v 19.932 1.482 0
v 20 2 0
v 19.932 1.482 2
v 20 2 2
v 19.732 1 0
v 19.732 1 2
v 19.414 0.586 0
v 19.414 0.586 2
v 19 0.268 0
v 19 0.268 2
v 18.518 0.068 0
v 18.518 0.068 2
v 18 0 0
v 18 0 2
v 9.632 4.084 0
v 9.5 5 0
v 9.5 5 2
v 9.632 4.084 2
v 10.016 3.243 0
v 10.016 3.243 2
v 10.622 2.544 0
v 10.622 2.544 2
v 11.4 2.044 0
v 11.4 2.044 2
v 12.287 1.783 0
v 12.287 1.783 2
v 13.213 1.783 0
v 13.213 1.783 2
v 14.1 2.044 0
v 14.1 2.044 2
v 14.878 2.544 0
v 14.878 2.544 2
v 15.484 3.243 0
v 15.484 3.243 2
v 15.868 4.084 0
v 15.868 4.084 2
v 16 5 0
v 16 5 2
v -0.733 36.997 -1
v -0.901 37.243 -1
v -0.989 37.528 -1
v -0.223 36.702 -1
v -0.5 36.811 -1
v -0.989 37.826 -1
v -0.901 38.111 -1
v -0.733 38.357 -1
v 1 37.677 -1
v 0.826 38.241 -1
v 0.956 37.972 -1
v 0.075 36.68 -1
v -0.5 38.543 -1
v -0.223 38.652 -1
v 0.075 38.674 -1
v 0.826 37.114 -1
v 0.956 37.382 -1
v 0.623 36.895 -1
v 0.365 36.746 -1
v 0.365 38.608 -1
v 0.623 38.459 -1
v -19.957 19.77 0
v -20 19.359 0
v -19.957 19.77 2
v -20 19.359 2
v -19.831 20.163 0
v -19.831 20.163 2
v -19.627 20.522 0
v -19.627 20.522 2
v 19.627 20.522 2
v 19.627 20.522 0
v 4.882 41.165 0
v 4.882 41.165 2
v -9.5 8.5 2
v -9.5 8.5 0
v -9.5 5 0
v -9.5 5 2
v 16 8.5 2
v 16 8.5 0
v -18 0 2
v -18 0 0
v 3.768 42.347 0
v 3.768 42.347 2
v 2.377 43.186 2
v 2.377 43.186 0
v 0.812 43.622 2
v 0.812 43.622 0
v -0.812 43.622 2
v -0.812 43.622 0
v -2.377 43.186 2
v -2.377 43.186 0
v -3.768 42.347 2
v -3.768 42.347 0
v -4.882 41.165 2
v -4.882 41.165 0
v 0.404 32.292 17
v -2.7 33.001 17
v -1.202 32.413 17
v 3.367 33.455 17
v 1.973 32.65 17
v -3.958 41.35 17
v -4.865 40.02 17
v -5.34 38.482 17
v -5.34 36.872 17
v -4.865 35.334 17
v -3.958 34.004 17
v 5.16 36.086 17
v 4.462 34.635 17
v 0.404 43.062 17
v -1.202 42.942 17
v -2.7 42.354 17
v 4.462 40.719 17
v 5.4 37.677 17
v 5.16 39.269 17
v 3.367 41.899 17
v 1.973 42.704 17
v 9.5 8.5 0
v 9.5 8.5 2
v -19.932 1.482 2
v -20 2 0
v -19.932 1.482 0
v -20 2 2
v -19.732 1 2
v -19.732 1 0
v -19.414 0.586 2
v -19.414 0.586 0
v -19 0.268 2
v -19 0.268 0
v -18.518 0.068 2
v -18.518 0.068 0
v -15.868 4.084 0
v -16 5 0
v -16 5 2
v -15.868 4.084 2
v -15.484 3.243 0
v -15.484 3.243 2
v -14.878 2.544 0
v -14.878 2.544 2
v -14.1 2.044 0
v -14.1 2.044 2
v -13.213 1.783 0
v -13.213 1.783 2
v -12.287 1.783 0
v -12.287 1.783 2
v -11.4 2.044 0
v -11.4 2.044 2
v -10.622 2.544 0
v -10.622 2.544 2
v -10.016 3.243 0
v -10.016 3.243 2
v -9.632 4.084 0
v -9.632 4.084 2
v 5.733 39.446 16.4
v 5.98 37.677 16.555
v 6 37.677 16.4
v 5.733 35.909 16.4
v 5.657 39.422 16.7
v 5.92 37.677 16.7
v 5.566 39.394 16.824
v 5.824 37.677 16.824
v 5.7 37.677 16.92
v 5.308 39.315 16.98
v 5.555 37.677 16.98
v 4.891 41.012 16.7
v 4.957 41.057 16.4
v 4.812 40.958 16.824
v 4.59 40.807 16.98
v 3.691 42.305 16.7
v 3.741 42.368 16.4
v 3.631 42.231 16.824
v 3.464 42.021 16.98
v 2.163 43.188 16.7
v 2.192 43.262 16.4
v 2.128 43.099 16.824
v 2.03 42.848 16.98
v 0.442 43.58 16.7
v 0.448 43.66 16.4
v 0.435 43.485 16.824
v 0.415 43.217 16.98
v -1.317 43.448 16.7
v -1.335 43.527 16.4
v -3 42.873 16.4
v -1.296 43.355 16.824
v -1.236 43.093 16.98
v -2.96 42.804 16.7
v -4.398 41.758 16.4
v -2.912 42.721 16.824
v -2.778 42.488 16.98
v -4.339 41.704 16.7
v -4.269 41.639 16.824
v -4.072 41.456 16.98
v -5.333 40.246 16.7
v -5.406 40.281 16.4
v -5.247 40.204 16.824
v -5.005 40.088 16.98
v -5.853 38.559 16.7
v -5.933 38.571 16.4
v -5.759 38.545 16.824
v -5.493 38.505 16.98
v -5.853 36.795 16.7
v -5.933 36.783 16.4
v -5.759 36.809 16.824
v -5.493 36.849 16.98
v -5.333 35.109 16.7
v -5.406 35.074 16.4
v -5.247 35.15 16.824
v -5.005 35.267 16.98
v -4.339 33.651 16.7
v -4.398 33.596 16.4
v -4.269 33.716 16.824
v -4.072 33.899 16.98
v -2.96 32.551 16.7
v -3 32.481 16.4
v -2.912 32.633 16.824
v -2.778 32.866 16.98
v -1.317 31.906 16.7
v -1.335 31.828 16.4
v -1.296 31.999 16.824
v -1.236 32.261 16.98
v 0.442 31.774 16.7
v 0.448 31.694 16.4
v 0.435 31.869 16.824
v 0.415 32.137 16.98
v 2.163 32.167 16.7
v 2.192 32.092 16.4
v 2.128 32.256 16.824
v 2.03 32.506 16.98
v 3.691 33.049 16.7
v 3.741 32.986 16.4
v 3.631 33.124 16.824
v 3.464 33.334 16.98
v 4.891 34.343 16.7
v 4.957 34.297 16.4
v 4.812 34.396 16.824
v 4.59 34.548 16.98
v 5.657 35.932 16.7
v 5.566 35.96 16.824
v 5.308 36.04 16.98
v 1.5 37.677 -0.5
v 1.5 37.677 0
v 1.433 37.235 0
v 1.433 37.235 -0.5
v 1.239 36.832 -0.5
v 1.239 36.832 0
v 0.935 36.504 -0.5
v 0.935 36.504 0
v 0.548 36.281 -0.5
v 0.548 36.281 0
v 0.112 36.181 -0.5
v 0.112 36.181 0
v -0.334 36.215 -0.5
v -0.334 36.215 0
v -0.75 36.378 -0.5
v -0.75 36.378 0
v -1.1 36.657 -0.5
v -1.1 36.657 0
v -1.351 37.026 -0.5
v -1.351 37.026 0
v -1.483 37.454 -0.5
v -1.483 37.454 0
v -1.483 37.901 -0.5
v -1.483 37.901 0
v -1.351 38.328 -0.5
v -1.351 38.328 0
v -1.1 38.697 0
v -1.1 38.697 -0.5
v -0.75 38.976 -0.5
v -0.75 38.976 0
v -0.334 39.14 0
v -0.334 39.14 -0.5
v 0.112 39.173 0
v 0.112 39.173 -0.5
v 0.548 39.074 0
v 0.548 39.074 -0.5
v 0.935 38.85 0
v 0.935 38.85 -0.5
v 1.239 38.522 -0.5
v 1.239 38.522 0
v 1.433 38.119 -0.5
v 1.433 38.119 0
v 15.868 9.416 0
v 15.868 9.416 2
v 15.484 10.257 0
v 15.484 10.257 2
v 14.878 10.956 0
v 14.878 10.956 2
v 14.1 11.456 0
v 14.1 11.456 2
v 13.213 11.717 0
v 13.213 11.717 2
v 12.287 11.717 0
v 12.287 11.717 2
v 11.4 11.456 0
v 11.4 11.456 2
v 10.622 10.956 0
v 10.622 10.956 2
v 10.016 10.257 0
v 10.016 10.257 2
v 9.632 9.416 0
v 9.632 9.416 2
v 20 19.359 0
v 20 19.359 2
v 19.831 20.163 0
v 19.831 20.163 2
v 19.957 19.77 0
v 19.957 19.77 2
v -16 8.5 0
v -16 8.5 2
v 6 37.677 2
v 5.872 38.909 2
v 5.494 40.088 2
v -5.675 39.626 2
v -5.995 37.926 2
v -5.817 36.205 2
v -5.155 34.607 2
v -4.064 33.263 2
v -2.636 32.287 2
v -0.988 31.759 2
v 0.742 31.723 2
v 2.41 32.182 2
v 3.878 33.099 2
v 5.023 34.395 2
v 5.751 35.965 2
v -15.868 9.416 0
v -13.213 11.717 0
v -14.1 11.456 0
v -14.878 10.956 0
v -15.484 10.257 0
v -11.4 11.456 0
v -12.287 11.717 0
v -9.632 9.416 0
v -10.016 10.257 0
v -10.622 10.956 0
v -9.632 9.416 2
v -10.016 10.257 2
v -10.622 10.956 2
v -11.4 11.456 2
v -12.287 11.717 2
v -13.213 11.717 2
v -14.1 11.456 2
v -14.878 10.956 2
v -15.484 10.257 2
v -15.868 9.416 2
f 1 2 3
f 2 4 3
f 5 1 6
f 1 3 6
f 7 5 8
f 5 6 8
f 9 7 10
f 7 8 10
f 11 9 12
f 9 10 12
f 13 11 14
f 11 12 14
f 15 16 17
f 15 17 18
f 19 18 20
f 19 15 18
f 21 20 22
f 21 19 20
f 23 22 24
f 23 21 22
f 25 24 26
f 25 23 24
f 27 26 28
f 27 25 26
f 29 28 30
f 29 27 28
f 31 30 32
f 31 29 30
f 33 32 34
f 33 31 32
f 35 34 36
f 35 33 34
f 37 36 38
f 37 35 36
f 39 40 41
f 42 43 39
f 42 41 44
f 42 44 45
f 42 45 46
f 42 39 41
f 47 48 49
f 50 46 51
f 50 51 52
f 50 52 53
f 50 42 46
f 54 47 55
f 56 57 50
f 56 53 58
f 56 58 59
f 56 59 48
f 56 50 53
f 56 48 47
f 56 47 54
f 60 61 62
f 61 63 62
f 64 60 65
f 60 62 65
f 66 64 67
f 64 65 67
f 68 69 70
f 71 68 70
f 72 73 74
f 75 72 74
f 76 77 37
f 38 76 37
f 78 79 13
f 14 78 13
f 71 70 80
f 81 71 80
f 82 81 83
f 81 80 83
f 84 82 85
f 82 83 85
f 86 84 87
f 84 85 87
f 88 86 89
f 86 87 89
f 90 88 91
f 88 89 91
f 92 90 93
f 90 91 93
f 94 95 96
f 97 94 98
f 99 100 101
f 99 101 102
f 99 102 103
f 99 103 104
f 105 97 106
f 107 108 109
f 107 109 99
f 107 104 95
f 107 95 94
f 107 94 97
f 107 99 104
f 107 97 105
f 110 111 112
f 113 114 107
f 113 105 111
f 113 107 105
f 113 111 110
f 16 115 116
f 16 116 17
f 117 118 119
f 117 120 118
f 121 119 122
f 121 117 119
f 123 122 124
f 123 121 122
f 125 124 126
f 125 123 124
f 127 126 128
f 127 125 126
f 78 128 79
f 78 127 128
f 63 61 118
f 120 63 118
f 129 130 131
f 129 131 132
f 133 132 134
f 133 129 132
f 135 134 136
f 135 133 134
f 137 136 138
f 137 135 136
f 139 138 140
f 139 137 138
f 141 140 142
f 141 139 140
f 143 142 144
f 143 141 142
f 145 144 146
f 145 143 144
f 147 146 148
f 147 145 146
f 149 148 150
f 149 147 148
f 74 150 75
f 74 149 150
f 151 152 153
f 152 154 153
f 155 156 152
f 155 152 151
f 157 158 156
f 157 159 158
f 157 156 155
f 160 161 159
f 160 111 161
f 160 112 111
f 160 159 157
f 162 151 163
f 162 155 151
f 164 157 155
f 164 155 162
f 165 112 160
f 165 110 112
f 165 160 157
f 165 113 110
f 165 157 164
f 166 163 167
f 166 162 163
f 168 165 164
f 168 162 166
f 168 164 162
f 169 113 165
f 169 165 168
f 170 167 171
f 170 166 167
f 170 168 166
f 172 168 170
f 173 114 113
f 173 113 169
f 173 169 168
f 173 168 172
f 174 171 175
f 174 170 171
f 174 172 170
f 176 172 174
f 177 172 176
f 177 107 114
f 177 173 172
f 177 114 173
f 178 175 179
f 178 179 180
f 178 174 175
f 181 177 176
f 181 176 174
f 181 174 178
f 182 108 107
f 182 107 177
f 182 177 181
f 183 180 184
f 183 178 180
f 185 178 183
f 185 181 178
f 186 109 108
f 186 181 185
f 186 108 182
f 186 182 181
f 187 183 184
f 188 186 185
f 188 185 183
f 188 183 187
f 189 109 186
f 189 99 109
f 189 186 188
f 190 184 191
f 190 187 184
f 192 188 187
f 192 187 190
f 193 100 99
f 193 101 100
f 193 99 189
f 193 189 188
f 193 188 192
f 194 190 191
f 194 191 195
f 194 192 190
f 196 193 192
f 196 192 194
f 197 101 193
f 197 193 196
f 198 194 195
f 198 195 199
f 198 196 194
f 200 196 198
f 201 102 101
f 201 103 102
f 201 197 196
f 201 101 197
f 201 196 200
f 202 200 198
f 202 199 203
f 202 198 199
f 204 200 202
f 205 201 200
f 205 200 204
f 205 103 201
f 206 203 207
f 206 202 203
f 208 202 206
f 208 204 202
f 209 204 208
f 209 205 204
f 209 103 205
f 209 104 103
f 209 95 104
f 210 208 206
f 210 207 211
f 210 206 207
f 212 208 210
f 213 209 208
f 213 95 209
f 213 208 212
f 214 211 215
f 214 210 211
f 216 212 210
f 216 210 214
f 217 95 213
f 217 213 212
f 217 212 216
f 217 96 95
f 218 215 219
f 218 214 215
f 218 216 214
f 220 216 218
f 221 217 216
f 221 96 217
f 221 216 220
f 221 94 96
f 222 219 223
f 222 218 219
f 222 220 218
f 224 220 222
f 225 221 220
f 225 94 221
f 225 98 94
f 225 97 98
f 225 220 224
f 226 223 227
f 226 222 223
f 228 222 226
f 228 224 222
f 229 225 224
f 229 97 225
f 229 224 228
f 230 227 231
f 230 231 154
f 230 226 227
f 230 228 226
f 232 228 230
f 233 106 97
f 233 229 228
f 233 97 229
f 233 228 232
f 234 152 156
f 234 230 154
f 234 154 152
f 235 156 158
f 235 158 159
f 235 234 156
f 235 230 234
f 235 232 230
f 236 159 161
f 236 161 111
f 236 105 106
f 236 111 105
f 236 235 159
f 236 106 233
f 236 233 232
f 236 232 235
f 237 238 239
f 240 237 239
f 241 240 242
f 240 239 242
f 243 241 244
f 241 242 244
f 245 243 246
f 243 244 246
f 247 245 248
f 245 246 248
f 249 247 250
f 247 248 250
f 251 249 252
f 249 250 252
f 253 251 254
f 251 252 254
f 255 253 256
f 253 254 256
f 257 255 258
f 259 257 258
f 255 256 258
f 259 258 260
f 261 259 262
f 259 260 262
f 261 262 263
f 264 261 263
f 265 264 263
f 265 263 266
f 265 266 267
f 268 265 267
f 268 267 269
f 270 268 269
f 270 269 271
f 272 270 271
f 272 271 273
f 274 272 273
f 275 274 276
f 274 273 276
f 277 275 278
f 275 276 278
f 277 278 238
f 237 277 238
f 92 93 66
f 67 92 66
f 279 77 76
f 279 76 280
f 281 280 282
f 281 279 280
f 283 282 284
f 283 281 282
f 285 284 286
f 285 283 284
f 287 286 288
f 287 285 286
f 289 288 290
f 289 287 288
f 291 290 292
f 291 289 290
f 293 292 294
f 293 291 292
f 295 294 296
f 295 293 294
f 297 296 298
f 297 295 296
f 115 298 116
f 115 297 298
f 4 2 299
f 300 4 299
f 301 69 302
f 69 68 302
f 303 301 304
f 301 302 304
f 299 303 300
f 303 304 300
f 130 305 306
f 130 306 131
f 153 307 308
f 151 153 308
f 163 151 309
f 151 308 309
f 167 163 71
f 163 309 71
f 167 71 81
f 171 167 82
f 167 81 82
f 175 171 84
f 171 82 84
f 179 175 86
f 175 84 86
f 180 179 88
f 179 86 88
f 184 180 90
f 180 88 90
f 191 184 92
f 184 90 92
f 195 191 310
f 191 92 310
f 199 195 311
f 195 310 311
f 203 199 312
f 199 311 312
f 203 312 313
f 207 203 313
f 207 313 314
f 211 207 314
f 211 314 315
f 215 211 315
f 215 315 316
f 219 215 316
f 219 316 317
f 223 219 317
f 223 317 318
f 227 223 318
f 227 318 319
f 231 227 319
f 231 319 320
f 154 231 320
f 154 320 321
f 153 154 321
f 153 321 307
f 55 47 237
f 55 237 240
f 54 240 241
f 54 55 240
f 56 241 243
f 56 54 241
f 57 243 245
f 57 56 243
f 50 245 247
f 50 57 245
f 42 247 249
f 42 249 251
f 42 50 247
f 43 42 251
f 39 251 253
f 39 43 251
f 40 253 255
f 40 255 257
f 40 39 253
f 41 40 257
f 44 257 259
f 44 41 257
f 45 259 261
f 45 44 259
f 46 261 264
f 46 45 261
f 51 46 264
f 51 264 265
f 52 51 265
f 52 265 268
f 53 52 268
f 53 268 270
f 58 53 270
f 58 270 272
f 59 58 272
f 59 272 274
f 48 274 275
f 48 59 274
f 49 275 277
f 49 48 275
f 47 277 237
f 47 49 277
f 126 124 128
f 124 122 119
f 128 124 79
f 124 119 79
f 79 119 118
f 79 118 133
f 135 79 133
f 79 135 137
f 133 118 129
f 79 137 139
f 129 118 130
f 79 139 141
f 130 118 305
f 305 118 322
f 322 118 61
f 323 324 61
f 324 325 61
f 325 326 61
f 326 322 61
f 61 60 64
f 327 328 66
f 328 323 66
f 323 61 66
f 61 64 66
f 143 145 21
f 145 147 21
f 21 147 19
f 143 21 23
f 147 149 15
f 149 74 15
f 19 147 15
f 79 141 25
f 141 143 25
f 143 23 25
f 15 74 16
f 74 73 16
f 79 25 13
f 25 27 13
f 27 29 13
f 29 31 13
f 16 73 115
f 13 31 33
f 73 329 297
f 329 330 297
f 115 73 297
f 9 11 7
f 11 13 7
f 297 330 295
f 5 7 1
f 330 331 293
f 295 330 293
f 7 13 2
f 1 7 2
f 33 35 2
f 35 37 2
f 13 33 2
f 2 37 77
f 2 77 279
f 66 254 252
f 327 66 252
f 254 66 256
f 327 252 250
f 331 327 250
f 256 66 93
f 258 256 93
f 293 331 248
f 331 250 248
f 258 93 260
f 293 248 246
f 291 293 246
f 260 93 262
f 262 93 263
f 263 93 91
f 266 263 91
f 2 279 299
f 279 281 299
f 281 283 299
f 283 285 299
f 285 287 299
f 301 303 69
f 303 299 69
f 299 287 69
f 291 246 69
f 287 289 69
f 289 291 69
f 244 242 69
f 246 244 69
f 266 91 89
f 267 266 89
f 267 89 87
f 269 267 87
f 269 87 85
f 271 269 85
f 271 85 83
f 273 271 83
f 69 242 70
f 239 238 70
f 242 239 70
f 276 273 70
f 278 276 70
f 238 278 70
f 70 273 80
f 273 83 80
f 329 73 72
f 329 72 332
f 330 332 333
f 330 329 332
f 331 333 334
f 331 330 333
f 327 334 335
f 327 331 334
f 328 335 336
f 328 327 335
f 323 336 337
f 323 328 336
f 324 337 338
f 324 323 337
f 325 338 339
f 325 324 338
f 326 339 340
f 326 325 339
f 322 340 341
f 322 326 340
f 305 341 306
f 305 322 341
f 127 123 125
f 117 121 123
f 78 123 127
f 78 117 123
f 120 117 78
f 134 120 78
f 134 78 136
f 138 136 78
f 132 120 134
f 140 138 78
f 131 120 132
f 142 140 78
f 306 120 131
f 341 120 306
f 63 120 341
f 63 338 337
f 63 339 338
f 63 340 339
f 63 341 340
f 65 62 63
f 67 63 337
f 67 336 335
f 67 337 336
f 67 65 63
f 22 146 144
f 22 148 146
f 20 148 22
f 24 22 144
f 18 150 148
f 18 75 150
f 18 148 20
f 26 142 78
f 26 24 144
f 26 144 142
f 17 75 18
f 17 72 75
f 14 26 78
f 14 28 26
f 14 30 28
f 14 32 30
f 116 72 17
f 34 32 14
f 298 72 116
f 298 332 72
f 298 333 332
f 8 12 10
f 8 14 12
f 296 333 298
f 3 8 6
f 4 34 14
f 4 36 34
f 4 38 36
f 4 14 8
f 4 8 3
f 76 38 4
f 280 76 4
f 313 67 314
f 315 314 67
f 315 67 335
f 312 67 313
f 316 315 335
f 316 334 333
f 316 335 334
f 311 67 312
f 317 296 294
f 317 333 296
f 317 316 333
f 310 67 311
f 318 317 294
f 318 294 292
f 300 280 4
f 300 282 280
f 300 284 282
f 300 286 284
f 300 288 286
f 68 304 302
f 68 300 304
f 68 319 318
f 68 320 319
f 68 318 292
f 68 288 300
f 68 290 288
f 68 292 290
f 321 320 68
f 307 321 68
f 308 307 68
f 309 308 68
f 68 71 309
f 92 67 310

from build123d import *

# Parameters (mm, degrees)
PAD_DEPTH    = 2
SKETCH001_R  = 6
PAD001_DEPTH = 15
SKETCH002_R  = 1.5
PAD002_DEPTH = 1
FILLET_R     = 2
FILLET001_R  = 0.6
CHAMFER_SIZE = 0.5


with BuildPart() as part:
    # Sketch → Pad (new body)
    with BuildSketch(Plane.XY):
        with BuildLine():
            Line((-20, 0), (20, 0))
            Line((20, 0), (20, 20))
            Line((20, 20), (4.882401, 41.164639))
            ThreePointArc((4.882401, 41.164639), (0, 43.67721), (-4.882401, 41.164639))
            Line((-4.882401, 41.164639), (-20, 20))
            Line((-20, 20), (-20, 0))
        make_face()
        with BuildLine():
            ThreePointArc((16, 8.5), (12.75, 11.75), (9.5, 8.5))
            Line((9.5, 8.5), (9.5, 5))
            ThreePointArc((9.5, 5), (12.75, 1.75), (16, 5))
            Line((16, 8.5), (16, 5))
        make_face(mode=Mode.SUBTRACT)
        with BuildLine():
            ThreePointArc((-9.5, 8.5), (-12.75, 11.75), (-16, 8.5))
            Line((-16, 8.5), (-16, 5))
            ThreePointArc((-16, 5), (-12.75, 1.75), (-9.5, 5))
            Line((-9.5, 8.5), (-9.5, 5))
        make_face(mode=Mode.SUBTRACT)
    extrude(amount=PAD_DEPTH)

    # Sketch001 (on Face16 of Pad) → Pad001 (join)
    with BuildSketch(Plane.XY.offset(2)):
        with Locations((0, 37.67721)):
            Circle(SKETCH001_R)
    extrude(amount=PAD001_DEPTH)

    # Sketch002 (on Face4 of Pad001) → Pad002 (join)
    with BuildSketch(Plane(origin=(0, 0, 0), x_dir=(1, 0, 0), z_dir=(0, 0, -1))):
        with Locations((0, -37.67721)):
            Circle(SKETCH002_R)
    extrude(amount=PAD002_DEPTH)

    # Fillet
    fillet_edges = [part.edges().sort_by_distance(p)[0] for p in [
        (20, 0, 1),
        (-20, 0, 1),
        (-20, 20, 1),
        (20, 20, 1),
    ]]
    fillet(fillet_edges, radius=FILLET_R)

    # Fillet001
    fillet001_edges = [part.edges().sort_by_distance(p)[0] for p in [
        (-6, 37.67721, 17),
    ]]
    fillet(fillet001_edges, radius=FILLET001_R)

    # Chamfer
    chamfer_edges = [part.edges().sort_by_distance(p)[0] for p in [
        (-1.5, 37.67721, -1),
    ]]
    chamfer(chamfer_edges, length=CHAMFER_SIZE)


solid = part.part
